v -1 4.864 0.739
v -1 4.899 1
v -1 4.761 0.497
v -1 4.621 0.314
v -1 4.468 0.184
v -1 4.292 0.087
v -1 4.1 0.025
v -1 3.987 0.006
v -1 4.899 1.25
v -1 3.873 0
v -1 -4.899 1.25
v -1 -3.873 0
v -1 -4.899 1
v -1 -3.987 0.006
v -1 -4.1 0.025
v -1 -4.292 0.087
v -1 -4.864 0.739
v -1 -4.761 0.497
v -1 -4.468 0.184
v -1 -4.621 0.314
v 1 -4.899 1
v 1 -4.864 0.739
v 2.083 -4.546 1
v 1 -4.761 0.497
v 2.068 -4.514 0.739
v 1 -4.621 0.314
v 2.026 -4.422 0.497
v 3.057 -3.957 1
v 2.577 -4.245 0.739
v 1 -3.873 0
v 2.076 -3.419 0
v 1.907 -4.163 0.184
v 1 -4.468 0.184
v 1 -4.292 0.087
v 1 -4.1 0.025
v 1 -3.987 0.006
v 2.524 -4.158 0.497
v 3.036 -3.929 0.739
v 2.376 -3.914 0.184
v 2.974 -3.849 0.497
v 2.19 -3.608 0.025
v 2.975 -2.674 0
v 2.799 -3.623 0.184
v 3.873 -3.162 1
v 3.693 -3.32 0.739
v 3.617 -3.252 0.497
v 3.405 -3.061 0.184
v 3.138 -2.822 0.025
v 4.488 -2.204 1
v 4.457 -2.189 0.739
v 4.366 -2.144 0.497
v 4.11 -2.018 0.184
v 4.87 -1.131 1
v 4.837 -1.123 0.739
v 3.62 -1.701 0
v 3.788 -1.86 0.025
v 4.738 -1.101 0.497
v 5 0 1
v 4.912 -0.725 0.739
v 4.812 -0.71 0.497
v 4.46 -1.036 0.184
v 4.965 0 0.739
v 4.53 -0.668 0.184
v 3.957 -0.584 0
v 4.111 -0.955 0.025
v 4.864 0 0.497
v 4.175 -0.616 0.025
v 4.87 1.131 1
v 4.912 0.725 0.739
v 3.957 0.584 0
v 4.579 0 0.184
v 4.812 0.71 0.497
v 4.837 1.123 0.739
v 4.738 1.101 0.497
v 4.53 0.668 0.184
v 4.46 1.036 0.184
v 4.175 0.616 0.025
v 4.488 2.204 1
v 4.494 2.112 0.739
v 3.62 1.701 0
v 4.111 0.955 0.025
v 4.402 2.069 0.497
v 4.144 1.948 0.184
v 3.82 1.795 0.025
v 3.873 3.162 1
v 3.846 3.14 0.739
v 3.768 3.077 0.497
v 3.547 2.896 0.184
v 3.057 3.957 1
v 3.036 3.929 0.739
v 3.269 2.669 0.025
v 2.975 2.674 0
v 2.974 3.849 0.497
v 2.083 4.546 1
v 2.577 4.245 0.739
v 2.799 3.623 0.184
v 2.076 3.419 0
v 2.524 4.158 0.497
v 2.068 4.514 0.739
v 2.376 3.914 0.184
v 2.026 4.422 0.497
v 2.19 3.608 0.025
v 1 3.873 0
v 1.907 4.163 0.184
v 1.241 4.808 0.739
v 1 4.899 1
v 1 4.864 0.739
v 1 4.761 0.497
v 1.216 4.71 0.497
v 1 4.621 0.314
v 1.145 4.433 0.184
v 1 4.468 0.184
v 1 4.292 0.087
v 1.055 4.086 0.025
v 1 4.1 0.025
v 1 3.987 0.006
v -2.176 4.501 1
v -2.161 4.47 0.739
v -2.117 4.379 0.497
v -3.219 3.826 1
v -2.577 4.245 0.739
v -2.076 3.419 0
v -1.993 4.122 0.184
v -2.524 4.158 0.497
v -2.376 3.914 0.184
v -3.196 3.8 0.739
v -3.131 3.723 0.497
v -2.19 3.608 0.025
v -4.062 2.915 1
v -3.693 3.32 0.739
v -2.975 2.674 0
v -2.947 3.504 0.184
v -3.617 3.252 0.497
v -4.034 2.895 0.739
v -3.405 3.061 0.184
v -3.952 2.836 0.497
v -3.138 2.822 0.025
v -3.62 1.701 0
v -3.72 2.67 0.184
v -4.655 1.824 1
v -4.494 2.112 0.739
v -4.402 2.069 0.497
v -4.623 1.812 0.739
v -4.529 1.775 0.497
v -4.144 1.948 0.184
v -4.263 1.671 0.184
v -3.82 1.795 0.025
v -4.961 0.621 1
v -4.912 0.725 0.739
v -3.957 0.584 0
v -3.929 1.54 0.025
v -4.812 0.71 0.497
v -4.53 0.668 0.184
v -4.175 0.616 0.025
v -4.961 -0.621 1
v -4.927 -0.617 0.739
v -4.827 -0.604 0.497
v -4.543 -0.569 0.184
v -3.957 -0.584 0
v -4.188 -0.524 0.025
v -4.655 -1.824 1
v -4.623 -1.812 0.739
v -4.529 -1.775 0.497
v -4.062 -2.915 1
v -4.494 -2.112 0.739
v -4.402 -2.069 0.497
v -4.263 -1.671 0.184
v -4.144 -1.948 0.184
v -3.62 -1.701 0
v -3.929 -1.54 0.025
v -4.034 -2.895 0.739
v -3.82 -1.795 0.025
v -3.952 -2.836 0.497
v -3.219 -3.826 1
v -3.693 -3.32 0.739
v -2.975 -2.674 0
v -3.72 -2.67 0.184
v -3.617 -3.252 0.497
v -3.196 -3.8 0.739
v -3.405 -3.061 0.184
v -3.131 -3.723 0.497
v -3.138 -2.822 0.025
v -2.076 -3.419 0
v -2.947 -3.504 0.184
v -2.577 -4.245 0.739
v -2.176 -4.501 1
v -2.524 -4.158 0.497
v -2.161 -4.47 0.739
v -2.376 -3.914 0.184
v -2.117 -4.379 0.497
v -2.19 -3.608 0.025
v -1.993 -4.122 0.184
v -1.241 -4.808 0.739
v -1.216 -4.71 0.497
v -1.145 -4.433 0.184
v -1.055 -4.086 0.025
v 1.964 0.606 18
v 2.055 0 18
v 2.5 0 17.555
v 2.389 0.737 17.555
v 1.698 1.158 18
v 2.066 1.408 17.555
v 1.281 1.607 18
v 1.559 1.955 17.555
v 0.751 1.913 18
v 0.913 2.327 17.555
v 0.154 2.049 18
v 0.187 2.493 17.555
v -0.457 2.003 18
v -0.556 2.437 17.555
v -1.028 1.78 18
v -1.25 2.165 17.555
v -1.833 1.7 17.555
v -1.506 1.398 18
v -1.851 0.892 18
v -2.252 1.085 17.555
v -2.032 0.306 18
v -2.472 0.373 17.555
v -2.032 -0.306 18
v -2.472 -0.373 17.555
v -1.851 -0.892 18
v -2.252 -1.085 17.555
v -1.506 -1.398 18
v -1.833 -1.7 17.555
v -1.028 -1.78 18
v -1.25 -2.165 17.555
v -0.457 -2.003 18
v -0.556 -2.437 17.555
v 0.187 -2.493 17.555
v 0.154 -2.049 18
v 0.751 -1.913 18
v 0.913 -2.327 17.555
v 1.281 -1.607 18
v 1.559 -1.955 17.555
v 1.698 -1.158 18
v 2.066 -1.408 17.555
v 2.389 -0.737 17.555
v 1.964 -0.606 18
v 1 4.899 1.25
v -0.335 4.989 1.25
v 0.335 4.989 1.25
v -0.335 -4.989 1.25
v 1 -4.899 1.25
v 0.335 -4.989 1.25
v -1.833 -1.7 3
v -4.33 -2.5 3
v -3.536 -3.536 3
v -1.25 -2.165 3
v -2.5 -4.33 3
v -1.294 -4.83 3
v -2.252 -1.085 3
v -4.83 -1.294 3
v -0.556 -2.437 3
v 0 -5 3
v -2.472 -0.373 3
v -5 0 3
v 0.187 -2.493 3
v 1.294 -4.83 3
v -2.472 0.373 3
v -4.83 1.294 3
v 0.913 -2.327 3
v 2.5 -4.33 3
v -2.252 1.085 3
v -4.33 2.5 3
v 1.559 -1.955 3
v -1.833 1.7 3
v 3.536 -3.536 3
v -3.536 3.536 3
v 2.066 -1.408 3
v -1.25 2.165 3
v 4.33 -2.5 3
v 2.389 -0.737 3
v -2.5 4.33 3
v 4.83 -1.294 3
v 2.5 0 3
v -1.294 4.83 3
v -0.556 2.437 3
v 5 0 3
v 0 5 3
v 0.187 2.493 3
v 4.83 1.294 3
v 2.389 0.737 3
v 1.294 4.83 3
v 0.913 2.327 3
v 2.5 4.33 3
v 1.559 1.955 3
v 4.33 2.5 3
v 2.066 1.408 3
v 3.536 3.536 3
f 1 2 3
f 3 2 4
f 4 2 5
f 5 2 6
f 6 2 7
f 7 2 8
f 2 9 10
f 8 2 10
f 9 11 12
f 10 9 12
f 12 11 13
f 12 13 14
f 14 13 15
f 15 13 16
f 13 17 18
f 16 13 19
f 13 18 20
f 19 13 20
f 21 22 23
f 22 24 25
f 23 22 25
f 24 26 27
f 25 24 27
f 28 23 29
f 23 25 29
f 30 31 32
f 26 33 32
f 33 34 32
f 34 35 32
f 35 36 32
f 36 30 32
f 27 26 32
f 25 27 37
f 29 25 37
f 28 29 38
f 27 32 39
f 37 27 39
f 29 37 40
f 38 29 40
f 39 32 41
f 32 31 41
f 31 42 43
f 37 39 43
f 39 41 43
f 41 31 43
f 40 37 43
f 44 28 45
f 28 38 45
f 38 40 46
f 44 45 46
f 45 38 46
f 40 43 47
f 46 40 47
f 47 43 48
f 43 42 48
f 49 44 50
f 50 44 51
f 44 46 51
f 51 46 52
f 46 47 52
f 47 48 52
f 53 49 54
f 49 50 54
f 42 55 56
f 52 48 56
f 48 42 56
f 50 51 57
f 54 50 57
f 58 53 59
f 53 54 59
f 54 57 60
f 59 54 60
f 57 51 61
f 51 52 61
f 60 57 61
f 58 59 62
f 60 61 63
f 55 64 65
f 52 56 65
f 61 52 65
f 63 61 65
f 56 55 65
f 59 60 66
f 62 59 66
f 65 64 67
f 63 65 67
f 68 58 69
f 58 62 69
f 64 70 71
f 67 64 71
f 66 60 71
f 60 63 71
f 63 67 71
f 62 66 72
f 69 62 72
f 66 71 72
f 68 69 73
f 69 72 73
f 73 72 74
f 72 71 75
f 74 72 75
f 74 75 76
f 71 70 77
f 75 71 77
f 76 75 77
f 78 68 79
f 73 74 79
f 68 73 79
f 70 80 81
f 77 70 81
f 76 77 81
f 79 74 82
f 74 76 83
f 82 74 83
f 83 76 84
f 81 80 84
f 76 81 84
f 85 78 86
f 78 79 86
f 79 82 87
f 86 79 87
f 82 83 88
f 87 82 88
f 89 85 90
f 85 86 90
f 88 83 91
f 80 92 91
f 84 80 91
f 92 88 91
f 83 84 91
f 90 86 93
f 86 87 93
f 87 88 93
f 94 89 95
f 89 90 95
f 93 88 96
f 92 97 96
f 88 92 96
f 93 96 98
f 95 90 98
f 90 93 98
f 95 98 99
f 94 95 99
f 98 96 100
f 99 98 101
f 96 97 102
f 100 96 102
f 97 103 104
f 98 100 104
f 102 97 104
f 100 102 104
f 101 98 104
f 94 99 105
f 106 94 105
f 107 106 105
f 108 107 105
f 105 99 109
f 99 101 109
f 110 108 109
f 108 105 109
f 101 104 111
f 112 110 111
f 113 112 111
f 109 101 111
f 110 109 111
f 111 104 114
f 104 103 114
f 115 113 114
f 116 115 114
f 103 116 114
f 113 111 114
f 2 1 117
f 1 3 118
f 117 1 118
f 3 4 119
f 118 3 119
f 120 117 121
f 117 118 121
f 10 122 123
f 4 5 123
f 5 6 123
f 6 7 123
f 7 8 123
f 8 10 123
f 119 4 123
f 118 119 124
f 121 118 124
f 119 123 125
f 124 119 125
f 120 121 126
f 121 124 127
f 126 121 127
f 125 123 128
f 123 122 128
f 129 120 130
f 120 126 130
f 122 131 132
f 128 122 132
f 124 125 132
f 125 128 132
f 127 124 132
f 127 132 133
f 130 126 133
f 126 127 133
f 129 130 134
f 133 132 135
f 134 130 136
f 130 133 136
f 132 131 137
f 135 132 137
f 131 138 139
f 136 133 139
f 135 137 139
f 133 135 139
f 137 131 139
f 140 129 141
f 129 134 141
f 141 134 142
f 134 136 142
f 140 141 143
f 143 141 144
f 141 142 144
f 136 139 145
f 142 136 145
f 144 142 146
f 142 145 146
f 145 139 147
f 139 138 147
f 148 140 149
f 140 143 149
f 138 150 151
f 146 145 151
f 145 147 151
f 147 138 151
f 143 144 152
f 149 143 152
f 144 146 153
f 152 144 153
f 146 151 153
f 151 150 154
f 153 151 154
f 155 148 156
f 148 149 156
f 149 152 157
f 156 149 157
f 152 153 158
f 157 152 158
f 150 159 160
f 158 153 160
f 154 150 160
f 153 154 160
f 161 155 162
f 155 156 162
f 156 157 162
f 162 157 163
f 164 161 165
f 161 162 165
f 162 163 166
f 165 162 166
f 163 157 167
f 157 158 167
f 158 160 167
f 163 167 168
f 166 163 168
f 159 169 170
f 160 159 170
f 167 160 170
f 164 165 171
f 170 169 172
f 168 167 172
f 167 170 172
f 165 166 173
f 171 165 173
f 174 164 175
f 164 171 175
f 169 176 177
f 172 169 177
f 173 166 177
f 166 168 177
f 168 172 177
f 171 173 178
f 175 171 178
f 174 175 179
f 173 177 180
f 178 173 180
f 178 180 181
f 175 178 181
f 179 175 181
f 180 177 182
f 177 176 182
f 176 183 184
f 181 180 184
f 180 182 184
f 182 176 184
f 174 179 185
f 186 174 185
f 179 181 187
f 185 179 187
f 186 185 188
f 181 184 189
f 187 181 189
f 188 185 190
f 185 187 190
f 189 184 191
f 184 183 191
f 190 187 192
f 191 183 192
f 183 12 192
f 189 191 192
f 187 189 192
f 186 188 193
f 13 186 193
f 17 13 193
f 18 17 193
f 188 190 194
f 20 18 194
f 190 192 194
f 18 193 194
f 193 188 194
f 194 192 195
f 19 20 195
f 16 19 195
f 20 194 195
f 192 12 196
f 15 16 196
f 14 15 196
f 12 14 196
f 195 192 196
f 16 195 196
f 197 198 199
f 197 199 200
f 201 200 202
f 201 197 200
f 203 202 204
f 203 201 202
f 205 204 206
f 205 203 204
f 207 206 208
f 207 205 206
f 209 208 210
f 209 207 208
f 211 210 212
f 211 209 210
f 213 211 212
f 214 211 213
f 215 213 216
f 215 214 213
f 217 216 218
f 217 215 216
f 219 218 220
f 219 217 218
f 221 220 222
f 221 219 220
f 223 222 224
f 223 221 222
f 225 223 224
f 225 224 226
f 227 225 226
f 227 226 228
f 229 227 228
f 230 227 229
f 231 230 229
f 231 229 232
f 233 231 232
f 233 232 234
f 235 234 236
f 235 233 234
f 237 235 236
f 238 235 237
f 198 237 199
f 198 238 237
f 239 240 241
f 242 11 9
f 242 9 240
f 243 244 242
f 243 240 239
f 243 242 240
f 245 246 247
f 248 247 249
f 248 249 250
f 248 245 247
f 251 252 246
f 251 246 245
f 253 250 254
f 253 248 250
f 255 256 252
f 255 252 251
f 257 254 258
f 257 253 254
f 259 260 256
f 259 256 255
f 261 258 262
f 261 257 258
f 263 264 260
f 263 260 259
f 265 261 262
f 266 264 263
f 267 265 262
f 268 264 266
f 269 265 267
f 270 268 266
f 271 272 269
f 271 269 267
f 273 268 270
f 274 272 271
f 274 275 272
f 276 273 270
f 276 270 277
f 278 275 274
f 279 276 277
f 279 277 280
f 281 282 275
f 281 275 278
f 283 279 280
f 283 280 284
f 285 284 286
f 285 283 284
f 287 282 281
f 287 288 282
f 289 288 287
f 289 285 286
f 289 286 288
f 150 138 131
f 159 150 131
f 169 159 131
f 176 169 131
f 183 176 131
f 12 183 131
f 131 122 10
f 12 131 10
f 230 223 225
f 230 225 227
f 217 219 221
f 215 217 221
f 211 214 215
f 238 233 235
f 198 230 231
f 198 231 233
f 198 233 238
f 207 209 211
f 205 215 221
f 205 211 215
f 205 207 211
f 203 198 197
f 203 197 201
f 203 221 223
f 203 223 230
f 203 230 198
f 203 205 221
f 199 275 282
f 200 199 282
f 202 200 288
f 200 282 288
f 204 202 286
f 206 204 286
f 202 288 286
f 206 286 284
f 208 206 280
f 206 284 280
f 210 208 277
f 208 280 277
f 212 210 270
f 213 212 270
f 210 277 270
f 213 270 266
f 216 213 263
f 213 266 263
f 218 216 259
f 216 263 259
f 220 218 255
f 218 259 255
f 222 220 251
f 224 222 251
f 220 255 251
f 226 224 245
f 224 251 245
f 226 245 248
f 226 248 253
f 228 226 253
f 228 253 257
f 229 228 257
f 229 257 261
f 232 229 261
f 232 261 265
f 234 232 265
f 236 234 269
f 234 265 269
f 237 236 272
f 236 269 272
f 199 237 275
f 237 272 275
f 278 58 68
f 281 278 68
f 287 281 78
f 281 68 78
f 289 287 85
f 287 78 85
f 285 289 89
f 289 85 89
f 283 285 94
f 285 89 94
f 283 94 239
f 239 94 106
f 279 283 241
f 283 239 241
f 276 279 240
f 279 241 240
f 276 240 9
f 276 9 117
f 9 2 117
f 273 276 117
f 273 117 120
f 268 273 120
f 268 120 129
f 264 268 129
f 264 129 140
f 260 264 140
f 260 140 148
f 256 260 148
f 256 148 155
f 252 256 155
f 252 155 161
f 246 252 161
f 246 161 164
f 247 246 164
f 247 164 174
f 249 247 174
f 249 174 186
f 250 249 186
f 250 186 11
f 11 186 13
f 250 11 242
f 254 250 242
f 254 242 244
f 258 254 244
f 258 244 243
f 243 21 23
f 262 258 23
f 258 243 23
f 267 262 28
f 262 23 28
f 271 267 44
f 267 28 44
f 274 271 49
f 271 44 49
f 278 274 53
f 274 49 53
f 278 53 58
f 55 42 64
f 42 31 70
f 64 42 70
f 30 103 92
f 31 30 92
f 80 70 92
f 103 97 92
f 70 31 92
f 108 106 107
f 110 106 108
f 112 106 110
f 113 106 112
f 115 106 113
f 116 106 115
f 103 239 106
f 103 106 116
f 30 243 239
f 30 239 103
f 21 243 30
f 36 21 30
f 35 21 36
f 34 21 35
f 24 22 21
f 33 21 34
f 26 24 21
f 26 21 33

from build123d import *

# Parameters (mm, degrees)
SKETCH_1_R               = 5
EXTRUDE_1_DEPTH          = 3
SKETCH_2_R               = 2.5
EXTRUDE_2_DEPTH          = 15
FILLET_1_R               = 1
SKETCH_3_W               = 2
SKETCH_3_H               = 2.5
CUT_EXTRUDE_1_DEPTH      = 6
CUT_EXTRUDE_1_DEPTH_BACK = 6.0000001
CHAMFER_1_SIZE           = 0.445


with BuildPart() as part:
    # Эскиз1 → Бобышка-Вытянуть1 (new body)
    with BuildSketch(Plane.XY):
        Circle(SKETCH_1_R)
    extrude(amount=EXTRUDE_1_DEPTH)

    # Эскиз2 → Бобышка-Вытянуть2 (add)
    with BuildSketch(Plane.XY.offset(3)):
        Circle(SKETCH_2_R)
    extrude(amount=EXTRUDE_2_DEPTH)

    # Скругление1
    fillet_1_edges = [part.edges().sort_by_distance(p)[0] for p in [
        (-5, 0, 0),
    ]]
    fillet(fillet_1_edges, radius=FILLET_1_R)

    # Эскиз3 → Вырез-Вытянуть1 (cut, two sides)
    with BuildSketch(Plane(origin=(0, 0, 0), x_dir=(1, 0, 0), z_dir=(0, 1, 0))) as cut_extrude_1_sk:
        Rectangle(SKETCH_3_W, SKETCH_3_H)
    extrude(amount=CUT_EXTRUDE_1_DEPTH, mode=Mode.SUBTRACT)
    extrude(cut_extrude_1_sk.sketch, amount=-CUT_EXTRUDE_1_DEPTH_BACK, mode=Mode.SUBTRACT)

    # Фаска1
    chamfer_1_edges = [part.edges().sort_by_distance(p)[0] for p in [
        (-2.5, 0, 18),
    ]]
    chamfer(chamfer_1_edges, length=CHAMFER_1_SIZE)


solid = part.part
